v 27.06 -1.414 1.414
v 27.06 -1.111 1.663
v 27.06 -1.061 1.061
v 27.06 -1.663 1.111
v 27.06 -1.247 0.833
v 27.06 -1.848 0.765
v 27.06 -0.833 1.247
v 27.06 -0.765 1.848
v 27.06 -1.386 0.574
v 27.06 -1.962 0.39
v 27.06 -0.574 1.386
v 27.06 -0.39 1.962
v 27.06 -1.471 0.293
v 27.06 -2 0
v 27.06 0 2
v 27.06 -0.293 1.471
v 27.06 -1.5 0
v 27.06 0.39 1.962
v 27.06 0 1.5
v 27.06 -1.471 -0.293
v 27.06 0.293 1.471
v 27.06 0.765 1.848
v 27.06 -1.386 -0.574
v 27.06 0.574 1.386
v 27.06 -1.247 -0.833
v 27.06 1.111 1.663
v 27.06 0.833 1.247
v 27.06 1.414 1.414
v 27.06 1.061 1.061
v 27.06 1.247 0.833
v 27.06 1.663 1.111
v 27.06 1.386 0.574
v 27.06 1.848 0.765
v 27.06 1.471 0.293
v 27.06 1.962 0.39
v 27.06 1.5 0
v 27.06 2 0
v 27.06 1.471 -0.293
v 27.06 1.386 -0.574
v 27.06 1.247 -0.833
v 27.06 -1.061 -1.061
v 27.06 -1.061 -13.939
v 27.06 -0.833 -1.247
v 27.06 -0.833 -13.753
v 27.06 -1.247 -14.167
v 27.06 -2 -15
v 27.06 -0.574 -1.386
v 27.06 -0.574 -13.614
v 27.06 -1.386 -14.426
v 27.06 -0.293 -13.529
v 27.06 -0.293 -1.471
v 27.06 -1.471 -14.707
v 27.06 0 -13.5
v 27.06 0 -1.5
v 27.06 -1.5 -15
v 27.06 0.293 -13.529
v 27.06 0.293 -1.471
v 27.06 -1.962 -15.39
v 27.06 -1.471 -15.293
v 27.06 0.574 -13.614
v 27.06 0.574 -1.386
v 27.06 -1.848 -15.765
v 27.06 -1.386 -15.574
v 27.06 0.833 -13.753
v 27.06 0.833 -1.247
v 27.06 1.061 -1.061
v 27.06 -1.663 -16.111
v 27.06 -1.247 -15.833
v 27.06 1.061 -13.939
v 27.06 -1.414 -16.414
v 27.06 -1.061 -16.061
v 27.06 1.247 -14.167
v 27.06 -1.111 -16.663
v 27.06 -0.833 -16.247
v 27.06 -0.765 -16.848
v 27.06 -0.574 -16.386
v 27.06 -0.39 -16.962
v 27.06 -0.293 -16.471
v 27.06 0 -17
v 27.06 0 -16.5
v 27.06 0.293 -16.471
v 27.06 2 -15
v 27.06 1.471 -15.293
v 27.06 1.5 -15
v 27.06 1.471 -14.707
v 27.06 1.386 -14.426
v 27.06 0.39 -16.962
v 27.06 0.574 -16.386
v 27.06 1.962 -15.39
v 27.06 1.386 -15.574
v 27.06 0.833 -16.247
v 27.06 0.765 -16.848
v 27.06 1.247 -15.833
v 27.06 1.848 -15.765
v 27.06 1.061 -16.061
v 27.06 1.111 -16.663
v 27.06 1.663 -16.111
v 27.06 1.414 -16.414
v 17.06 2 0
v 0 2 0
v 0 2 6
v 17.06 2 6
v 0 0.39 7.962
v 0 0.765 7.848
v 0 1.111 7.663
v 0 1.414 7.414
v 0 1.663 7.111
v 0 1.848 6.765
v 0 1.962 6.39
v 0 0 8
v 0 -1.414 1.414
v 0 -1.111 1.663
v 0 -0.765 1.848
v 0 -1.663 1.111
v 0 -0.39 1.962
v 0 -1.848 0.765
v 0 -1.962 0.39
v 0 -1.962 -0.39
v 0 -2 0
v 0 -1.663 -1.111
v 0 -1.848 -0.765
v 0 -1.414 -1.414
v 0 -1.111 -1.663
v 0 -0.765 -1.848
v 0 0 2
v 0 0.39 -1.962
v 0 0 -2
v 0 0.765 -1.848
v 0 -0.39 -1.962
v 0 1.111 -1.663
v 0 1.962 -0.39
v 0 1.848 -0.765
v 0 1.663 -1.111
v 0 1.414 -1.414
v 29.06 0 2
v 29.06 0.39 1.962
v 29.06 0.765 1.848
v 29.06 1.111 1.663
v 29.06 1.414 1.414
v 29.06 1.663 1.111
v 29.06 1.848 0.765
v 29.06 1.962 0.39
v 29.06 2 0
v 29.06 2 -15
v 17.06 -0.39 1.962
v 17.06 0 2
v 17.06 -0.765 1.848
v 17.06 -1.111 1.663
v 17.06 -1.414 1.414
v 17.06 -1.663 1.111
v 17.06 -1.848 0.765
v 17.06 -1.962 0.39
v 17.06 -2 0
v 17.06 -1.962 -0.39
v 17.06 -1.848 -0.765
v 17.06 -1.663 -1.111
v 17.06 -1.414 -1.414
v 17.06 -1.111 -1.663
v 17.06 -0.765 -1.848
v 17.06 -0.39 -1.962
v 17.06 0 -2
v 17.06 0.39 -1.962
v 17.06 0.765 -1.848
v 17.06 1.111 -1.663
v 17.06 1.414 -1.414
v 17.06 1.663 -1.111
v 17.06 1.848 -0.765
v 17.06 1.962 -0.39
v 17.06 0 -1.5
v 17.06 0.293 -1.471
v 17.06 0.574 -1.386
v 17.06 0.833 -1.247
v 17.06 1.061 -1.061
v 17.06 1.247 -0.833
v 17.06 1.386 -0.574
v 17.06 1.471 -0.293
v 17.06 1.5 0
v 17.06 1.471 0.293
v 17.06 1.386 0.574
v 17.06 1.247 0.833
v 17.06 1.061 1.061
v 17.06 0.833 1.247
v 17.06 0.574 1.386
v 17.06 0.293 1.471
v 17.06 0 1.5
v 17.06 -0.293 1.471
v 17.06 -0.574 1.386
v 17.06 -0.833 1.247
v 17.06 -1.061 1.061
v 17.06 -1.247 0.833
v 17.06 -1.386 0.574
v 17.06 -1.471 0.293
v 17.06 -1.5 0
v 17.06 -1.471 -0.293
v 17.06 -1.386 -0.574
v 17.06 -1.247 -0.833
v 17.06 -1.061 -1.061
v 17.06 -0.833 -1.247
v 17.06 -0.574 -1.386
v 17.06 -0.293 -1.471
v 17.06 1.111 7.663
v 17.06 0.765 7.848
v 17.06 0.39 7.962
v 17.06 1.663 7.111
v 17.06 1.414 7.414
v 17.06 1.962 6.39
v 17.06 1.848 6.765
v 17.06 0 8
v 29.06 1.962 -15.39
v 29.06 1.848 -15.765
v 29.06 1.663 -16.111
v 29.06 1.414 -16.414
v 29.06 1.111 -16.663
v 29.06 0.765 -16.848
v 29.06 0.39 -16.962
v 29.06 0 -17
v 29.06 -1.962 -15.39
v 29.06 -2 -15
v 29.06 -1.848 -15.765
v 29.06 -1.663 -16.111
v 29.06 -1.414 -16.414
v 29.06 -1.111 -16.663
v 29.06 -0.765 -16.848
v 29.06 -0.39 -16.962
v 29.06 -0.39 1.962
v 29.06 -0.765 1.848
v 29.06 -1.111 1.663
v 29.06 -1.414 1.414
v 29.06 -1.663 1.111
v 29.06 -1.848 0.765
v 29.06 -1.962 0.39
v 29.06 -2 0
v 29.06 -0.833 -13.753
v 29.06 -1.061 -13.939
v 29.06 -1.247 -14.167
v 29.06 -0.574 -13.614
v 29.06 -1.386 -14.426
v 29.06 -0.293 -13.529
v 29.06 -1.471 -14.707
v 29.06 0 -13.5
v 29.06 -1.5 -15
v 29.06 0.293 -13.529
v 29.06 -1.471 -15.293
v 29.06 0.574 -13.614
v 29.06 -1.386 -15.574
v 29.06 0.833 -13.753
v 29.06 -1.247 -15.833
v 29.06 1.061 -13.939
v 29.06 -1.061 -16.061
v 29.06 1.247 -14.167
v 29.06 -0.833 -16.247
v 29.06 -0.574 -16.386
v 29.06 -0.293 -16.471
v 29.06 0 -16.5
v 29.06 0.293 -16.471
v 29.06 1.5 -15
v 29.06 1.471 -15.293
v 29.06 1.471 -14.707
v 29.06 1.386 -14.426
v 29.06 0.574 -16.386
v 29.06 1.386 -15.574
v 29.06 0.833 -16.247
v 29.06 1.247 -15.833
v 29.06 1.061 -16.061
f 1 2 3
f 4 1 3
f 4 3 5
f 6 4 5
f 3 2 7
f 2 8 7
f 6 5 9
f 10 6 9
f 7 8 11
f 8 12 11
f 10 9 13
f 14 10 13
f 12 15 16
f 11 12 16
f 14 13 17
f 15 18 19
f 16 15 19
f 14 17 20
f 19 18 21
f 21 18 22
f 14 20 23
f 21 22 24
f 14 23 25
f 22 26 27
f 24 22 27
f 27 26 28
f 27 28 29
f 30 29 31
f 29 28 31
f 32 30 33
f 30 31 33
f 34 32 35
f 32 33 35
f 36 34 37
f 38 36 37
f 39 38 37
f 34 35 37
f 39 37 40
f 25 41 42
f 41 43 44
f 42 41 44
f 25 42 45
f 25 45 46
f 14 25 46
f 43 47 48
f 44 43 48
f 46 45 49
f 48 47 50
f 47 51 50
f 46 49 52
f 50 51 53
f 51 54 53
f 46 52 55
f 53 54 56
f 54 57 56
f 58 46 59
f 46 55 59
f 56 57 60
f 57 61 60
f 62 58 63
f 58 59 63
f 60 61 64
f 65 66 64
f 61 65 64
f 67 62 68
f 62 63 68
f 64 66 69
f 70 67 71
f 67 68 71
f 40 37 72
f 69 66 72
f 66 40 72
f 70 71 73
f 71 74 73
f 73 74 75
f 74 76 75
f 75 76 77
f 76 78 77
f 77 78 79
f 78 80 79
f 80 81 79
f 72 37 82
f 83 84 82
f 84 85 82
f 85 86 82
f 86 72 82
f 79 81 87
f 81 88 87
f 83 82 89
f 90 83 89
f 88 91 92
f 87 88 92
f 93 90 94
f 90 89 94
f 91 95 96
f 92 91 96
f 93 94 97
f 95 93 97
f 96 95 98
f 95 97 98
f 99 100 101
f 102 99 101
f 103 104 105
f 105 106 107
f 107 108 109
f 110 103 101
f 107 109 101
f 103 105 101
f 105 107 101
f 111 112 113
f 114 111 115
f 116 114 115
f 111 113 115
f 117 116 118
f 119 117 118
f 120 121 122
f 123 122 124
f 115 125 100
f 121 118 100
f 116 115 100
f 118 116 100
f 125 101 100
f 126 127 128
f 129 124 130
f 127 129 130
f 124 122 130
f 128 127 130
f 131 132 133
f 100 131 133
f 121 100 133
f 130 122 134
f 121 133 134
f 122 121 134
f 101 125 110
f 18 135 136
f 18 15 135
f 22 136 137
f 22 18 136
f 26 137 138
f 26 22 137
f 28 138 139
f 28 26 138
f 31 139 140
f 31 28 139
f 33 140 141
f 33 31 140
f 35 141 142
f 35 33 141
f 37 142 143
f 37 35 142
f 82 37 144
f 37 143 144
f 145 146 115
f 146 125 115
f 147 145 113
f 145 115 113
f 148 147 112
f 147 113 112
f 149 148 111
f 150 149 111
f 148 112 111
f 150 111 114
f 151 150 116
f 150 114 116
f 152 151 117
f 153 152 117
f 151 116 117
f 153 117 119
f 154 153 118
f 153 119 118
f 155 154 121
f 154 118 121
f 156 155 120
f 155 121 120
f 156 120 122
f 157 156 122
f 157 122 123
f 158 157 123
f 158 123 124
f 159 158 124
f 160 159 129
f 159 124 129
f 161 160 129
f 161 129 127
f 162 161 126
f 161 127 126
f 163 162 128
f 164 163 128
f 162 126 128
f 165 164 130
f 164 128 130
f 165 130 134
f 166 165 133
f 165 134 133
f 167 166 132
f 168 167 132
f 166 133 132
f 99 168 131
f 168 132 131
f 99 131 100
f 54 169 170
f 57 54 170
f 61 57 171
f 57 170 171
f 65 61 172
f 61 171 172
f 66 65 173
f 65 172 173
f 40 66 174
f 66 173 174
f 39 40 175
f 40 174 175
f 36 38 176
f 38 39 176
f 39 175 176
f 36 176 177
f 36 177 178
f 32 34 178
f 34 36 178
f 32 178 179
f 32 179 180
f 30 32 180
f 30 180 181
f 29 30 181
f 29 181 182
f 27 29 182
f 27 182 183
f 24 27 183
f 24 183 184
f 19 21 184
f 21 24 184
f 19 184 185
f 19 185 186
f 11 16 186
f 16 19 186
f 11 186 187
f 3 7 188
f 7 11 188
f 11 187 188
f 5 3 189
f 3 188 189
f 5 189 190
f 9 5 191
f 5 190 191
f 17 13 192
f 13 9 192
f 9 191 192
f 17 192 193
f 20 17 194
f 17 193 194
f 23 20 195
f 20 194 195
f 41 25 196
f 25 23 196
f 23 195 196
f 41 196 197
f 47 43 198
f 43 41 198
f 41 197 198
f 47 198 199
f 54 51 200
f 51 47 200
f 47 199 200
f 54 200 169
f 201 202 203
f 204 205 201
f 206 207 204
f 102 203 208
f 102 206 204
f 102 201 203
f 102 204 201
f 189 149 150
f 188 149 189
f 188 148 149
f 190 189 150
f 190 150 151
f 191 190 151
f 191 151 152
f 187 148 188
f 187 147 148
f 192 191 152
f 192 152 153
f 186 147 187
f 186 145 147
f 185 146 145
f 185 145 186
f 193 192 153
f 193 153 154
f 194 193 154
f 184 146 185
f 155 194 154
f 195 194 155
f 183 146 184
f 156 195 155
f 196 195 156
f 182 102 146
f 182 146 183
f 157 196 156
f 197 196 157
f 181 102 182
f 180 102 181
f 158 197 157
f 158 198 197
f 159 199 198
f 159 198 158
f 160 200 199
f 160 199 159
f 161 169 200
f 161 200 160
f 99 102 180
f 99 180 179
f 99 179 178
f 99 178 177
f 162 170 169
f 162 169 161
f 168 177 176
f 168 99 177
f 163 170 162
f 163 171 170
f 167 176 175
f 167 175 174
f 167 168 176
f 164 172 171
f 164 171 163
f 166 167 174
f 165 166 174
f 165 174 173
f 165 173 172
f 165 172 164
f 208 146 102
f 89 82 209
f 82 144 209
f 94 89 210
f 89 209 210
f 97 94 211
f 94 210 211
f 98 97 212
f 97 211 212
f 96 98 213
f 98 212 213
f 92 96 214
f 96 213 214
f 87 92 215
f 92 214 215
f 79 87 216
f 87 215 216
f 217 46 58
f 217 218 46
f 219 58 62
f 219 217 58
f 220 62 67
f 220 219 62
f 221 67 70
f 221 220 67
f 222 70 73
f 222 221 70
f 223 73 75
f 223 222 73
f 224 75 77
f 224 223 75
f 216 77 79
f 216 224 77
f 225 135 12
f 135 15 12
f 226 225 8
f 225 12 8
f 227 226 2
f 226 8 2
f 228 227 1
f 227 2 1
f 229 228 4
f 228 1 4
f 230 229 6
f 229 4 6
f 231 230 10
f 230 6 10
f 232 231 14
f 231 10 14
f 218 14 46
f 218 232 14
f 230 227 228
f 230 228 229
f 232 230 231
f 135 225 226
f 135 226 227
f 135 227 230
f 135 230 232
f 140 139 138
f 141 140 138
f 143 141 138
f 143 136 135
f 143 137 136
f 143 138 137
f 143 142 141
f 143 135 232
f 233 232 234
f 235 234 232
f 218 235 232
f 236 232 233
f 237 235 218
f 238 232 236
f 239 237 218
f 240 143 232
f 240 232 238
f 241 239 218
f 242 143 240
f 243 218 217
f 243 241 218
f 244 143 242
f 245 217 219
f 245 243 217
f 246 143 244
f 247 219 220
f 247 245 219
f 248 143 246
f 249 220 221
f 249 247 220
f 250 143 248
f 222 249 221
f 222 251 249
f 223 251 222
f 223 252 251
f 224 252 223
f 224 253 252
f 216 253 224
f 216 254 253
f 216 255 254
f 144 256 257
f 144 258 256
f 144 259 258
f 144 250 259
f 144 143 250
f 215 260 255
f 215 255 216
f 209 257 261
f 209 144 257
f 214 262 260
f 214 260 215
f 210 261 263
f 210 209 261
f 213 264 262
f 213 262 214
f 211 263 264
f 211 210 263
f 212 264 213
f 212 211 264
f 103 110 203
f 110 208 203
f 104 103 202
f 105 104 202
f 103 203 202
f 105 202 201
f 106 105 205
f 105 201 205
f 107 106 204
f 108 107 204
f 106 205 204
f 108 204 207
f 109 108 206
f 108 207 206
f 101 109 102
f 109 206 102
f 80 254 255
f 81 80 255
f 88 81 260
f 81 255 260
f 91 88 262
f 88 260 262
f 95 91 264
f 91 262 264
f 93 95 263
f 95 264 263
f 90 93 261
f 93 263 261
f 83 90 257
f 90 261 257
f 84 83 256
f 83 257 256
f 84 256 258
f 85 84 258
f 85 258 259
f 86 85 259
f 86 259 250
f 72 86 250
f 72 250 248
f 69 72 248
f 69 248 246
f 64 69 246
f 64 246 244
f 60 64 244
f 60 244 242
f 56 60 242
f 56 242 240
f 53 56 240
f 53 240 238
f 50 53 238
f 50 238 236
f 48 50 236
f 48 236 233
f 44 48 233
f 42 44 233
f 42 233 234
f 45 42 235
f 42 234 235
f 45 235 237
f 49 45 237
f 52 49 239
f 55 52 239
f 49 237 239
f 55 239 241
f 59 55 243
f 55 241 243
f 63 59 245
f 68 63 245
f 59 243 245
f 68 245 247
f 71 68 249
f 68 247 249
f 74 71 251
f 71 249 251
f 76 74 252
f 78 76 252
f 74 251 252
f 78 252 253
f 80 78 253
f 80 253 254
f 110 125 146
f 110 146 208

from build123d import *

# Parameters (mm, degrees)
SKETCH2_R           = 2
BOSS_EXTRUDE1_DEPTH = 17.06
SKETCH3_R           = 1.5
BOSS_EXTRUDE2_DEPTH = 12
SKETCH4_W           = 3.988125856
SKETCH4_H           = 4
BOSS_EXTRUDE3_DEPTH = 2
SKETCH5_W           = 2
SKETCH5_H           = 4
BOSS_EXTRUDE4_DEPTH = 19
FILLET1_R           = 2
FILLET2_R           = 2
FILLET3_R           = 2
SKETCH6_R           = 1.5
CUT_EXTRUDE1_DEPTH  = 34.726600777
SKETCH10_W          = 8
SKETCH10_H          = 2
BOSS_EXTRUDE8_DEPTH = 17.06
FILLET6_R           = 2


with BuildPart() as part:
    # Sketch2 → Boss-Extrude1 (new body)
    with BuildSketch(Plane(origin=(0, 0, 0), x_dir=(0, 0, -1), z_dir=(1, 0, 0))):
        Circle(SKETCH2_R)
    extrude(amount=BOSS_EXTRUDE1_DEPTH)

    # Sketch3 → Boss-Extrude2 (add)
    with BuildSketch(Plane(origin=(17.06, 0, 0), x_dir=(0, 0, -1), z_dir=(1, 0, 0))):
        Circle(SKETCH3_R)
    extrude(amount=BOSS_EXTRUDE2_DEPTH)

    # Sketch4 → Boss-Extrude3 (add)
    with BuildSketch(Plane(origin=(29.06, 0, 0), x_dir=(0, 0, -1), z_dir=(1, 0, 0))):
        with Locations((-0.005937072, 0)):
            Rectangle(SKETCH4_W, SKETCH4_H)
    extrude(amount=-BOSS_EXTRUDE3_DEPTH)

    # Sketch5 → Boss-Extrude4 (add)
    with BuildSketch(Plane.XY.offset(2)):
        with Locations((28.06, 0)):
            Rectangle(SKETCH5_W, SKETCH5_H)
    extrude(amount=-BOSS_EXTRUDE4_DEPTH)

    # Fillet1
    fillet1_edges = [part.edges().sort_by_distance(p)[0] for p in [
        (28.06, 2, 2),
    ]]
    fillet(fillet1_edges, radius=FILLET1_R)

    # Fillet2
    fillet2_edges = [part.edges().sort_by_distance(p)[0] for p in [
        (28.06, -2, 2),
    ]]
    fillet(fillet2_edges, radius=FILLET2_R - 0.0001)  # a hair under: the kernel refuses the full size

    # Fillet3
    fillet3_edges = [part.edges().sort_by_distance(p)[0] for p in [
        (28.06, -2, -17),
        (28.06, 2, -17),
    ]]
    fillet(fillet3_edges, radius=FILLET3_R - 0.0001)  # a hair under: the kernel refuses the full size

    # Sketch6 → Cut-Extrude1 (cut, through all)
    with BuildSketch(Plane(origin=(29.06, 0, 0), x_dir=(0, 0, -1), z_dir=(1, 0, 0))):
        with Locations((15, 0)):
            Circle(SKETCH6_R)
    extrude(amount=-CUT_EXTRUDE1_DEPTH, mode=Mode.SUBTRACT)

    # Sketch10 → Boss-Extrude8 (add)
    with BuildSketch(Plane.ZY):
        with Locations((4, 1)):
            Rectangle(SKETCH10_W, SKETCH10_H)
    extrude(amount=-BOSS_EXTRUDE8_DEPTH)

    # Fillet6
    fillet6_edges = [part.edges().sort_by_distance(p)[0] for p in [
        (8.53, 2, 8),
    ]]
    fillet(fillet6_edges, radius=FILLET6_R - 0.0001)  # a hair under: the kernel refuses the full size


solid = part.part
